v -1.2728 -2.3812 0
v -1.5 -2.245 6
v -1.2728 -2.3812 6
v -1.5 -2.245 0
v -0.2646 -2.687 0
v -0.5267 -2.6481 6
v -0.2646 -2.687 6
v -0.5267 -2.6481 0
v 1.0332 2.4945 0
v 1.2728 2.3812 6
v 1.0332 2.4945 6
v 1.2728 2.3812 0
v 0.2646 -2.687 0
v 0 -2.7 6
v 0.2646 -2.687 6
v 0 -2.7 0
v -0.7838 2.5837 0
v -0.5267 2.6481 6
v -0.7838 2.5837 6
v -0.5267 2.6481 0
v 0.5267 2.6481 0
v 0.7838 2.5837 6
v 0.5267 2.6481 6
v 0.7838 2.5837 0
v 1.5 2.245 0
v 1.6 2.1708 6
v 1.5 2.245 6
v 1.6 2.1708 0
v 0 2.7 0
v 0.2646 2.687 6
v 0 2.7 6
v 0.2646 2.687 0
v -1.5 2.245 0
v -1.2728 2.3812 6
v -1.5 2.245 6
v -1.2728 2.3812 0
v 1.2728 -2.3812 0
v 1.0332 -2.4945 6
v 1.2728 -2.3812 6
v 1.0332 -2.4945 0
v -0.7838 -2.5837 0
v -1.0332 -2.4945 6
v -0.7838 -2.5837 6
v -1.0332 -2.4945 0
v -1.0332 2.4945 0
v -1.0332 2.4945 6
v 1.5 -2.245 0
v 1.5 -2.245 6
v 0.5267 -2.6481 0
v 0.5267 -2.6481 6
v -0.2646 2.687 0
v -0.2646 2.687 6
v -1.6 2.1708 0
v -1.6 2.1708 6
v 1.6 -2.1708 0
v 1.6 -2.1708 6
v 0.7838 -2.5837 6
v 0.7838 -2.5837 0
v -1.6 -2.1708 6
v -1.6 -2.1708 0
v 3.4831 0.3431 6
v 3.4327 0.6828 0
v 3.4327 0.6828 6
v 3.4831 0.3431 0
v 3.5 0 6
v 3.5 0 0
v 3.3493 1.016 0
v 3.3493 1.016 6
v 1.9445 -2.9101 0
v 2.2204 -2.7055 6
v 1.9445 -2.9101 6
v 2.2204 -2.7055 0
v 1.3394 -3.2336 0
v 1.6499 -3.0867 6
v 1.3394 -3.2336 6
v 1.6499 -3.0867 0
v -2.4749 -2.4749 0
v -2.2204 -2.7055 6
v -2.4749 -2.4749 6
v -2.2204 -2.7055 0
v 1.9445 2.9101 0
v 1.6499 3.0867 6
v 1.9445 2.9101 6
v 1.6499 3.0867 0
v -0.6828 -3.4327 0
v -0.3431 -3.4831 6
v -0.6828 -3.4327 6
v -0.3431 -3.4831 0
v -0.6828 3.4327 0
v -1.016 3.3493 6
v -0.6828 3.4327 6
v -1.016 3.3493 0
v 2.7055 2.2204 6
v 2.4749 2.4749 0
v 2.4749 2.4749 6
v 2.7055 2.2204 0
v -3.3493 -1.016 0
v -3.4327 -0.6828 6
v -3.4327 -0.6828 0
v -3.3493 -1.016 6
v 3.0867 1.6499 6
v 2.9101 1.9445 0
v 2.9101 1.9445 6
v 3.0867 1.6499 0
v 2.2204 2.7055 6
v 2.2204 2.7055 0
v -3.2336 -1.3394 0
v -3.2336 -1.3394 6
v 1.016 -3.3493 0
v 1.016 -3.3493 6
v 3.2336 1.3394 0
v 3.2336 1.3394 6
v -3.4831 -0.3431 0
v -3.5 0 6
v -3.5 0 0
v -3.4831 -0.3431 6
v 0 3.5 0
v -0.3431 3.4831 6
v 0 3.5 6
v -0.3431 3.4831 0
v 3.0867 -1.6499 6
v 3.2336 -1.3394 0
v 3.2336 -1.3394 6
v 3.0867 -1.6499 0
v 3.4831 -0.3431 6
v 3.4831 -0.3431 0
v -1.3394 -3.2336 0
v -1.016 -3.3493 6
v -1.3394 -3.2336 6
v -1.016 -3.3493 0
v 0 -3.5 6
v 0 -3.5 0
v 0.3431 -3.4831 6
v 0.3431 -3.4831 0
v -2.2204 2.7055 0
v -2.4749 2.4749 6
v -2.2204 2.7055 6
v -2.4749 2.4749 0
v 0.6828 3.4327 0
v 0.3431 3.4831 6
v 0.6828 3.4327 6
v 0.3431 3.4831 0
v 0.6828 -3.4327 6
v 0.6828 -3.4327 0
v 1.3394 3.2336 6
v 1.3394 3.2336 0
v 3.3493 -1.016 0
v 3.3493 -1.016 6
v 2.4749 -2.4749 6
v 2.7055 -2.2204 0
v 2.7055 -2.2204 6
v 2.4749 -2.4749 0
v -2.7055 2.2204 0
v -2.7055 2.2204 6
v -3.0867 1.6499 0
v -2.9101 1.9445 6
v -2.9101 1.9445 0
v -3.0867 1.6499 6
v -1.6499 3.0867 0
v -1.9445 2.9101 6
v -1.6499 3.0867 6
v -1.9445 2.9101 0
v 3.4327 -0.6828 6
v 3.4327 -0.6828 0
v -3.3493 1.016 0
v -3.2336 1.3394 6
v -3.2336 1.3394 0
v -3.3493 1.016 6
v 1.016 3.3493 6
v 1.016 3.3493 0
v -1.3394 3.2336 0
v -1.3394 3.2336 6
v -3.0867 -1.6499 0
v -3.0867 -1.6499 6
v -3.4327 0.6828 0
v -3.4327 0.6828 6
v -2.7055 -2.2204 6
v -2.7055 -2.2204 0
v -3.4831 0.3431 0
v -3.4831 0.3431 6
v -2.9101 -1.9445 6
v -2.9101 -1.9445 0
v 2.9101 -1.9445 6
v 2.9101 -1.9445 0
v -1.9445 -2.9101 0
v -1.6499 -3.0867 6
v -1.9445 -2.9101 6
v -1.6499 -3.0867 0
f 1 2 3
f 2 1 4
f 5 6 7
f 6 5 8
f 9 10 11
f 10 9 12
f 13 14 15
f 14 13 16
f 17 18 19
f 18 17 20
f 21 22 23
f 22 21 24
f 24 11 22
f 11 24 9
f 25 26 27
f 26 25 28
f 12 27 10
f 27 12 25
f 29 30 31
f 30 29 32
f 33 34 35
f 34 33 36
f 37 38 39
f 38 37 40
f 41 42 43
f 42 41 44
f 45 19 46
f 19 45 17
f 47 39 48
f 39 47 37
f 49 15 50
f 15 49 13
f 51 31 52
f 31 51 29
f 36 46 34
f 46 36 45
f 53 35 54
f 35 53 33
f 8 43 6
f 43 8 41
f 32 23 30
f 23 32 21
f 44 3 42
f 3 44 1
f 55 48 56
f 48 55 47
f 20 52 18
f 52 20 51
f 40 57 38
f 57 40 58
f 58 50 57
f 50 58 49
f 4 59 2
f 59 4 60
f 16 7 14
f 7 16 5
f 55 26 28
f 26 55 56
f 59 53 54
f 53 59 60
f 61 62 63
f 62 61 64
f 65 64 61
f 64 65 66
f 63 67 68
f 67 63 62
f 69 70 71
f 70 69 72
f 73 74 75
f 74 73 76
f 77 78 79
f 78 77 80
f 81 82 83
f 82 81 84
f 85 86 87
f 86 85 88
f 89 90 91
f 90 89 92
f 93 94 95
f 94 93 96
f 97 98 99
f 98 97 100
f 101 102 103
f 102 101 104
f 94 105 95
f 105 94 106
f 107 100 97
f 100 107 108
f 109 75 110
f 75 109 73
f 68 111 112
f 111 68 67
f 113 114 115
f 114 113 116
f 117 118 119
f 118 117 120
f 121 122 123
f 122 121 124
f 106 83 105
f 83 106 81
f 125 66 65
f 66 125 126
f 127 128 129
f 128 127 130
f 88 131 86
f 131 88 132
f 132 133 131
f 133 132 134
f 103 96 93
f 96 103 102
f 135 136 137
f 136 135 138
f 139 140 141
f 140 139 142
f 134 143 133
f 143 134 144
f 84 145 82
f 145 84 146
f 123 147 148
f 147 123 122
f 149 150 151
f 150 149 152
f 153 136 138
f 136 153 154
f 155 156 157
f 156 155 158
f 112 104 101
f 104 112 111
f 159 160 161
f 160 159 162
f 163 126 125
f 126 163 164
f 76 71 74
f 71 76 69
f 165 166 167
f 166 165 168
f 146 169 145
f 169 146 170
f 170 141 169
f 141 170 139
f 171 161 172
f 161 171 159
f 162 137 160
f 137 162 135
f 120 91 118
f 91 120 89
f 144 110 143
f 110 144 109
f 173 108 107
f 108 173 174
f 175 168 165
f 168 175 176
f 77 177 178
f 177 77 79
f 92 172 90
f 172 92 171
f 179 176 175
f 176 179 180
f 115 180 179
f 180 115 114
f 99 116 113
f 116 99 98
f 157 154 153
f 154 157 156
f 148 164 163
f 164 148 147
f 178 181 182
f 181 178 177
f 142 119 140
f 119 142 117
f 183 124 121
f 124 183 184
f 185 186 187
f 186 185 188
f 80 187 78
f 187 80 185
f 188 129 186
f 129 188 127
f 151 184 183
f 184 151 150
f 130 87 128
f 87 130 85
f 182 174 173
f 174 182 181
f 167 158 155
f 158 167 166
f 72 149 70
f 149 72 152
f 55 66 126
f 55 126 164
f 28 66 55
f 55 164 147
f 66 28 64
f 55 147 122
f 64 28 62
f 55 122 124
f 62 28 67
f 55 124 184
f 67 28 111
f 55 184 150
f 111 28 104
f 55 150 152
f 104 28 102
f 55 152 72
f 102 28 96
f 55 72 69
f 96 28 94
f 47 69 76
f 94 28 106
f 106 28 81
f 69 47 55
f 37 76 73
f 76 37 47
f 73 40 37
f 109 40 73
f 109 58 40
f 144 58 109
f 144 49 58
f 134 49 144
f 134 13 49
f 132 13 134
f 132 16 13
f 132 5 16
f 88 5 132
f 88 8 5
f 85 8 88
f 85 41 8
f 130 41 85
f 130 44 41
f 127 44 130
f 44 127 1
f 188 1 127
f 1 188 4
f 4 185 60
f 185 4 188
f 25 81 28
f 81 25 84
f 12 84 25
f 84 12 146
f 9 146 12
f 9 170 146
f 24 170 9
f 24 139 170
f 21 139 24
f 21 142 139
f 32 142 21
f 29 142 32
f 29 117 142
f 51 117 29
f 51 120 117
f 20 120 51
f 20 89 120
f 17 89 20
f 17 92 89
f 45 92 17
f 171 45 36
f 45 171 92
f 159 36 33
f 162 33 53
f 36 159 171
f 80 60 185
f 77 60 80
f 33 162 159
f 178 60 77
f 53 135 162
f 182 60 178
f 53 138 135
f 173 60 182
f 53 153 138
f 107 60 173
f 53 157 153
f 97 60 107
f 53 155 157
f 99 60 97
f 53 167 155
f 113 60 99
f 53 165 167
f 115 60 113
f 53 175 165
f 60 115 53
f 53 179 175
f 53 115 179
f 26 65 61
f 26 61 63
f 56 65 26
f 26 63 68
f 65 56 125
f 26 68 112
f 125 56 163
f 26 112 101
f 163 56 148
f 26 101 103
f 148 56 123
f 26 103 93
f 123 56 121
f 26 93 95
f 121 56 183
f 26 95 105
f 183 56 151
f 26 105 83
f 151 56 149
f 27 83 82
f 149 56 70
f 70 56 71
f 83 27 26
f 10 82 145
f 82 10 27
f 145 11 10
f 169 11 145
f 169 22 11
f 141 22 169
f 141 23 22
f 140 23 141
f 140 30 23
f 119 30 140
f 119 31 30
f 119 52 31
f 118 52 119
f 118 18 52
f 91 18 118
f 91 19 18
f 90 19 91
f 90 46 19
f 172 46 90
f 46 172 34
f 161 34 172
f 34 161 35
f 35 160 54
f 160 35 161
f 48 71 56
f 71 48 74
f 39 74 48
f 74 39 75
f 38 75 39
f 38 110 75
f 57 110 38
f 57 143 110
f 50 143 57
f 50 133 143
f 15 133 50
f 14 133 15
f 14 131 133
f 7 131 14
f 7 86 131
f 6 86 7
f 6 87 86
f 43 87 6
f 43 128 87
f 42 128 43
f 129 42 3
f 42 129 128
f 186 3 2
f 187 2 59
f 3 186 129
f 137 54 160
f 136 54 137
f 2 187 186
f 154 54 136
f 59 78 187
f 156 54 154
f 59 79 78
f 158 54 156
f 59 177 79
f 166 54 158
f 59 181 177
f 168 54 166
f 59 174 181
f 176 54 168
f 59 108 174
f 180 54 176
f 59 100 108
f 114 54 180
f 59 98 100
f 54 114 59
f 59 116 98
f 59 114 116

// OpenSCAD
$fn=64;
difference() {
  cylinder(r=3.5,h=6);
  translate([0,0,-0.5]) pegHole();
}


module pegHole() {
  pw=3.2;
  pr=2.7;
  ph=7;

  intersection() {
    cylinder(r=pr,h=ph);
    translate([-pw/2,-pr,0]) cube([pw,pr*2,ph]);
  }
}
